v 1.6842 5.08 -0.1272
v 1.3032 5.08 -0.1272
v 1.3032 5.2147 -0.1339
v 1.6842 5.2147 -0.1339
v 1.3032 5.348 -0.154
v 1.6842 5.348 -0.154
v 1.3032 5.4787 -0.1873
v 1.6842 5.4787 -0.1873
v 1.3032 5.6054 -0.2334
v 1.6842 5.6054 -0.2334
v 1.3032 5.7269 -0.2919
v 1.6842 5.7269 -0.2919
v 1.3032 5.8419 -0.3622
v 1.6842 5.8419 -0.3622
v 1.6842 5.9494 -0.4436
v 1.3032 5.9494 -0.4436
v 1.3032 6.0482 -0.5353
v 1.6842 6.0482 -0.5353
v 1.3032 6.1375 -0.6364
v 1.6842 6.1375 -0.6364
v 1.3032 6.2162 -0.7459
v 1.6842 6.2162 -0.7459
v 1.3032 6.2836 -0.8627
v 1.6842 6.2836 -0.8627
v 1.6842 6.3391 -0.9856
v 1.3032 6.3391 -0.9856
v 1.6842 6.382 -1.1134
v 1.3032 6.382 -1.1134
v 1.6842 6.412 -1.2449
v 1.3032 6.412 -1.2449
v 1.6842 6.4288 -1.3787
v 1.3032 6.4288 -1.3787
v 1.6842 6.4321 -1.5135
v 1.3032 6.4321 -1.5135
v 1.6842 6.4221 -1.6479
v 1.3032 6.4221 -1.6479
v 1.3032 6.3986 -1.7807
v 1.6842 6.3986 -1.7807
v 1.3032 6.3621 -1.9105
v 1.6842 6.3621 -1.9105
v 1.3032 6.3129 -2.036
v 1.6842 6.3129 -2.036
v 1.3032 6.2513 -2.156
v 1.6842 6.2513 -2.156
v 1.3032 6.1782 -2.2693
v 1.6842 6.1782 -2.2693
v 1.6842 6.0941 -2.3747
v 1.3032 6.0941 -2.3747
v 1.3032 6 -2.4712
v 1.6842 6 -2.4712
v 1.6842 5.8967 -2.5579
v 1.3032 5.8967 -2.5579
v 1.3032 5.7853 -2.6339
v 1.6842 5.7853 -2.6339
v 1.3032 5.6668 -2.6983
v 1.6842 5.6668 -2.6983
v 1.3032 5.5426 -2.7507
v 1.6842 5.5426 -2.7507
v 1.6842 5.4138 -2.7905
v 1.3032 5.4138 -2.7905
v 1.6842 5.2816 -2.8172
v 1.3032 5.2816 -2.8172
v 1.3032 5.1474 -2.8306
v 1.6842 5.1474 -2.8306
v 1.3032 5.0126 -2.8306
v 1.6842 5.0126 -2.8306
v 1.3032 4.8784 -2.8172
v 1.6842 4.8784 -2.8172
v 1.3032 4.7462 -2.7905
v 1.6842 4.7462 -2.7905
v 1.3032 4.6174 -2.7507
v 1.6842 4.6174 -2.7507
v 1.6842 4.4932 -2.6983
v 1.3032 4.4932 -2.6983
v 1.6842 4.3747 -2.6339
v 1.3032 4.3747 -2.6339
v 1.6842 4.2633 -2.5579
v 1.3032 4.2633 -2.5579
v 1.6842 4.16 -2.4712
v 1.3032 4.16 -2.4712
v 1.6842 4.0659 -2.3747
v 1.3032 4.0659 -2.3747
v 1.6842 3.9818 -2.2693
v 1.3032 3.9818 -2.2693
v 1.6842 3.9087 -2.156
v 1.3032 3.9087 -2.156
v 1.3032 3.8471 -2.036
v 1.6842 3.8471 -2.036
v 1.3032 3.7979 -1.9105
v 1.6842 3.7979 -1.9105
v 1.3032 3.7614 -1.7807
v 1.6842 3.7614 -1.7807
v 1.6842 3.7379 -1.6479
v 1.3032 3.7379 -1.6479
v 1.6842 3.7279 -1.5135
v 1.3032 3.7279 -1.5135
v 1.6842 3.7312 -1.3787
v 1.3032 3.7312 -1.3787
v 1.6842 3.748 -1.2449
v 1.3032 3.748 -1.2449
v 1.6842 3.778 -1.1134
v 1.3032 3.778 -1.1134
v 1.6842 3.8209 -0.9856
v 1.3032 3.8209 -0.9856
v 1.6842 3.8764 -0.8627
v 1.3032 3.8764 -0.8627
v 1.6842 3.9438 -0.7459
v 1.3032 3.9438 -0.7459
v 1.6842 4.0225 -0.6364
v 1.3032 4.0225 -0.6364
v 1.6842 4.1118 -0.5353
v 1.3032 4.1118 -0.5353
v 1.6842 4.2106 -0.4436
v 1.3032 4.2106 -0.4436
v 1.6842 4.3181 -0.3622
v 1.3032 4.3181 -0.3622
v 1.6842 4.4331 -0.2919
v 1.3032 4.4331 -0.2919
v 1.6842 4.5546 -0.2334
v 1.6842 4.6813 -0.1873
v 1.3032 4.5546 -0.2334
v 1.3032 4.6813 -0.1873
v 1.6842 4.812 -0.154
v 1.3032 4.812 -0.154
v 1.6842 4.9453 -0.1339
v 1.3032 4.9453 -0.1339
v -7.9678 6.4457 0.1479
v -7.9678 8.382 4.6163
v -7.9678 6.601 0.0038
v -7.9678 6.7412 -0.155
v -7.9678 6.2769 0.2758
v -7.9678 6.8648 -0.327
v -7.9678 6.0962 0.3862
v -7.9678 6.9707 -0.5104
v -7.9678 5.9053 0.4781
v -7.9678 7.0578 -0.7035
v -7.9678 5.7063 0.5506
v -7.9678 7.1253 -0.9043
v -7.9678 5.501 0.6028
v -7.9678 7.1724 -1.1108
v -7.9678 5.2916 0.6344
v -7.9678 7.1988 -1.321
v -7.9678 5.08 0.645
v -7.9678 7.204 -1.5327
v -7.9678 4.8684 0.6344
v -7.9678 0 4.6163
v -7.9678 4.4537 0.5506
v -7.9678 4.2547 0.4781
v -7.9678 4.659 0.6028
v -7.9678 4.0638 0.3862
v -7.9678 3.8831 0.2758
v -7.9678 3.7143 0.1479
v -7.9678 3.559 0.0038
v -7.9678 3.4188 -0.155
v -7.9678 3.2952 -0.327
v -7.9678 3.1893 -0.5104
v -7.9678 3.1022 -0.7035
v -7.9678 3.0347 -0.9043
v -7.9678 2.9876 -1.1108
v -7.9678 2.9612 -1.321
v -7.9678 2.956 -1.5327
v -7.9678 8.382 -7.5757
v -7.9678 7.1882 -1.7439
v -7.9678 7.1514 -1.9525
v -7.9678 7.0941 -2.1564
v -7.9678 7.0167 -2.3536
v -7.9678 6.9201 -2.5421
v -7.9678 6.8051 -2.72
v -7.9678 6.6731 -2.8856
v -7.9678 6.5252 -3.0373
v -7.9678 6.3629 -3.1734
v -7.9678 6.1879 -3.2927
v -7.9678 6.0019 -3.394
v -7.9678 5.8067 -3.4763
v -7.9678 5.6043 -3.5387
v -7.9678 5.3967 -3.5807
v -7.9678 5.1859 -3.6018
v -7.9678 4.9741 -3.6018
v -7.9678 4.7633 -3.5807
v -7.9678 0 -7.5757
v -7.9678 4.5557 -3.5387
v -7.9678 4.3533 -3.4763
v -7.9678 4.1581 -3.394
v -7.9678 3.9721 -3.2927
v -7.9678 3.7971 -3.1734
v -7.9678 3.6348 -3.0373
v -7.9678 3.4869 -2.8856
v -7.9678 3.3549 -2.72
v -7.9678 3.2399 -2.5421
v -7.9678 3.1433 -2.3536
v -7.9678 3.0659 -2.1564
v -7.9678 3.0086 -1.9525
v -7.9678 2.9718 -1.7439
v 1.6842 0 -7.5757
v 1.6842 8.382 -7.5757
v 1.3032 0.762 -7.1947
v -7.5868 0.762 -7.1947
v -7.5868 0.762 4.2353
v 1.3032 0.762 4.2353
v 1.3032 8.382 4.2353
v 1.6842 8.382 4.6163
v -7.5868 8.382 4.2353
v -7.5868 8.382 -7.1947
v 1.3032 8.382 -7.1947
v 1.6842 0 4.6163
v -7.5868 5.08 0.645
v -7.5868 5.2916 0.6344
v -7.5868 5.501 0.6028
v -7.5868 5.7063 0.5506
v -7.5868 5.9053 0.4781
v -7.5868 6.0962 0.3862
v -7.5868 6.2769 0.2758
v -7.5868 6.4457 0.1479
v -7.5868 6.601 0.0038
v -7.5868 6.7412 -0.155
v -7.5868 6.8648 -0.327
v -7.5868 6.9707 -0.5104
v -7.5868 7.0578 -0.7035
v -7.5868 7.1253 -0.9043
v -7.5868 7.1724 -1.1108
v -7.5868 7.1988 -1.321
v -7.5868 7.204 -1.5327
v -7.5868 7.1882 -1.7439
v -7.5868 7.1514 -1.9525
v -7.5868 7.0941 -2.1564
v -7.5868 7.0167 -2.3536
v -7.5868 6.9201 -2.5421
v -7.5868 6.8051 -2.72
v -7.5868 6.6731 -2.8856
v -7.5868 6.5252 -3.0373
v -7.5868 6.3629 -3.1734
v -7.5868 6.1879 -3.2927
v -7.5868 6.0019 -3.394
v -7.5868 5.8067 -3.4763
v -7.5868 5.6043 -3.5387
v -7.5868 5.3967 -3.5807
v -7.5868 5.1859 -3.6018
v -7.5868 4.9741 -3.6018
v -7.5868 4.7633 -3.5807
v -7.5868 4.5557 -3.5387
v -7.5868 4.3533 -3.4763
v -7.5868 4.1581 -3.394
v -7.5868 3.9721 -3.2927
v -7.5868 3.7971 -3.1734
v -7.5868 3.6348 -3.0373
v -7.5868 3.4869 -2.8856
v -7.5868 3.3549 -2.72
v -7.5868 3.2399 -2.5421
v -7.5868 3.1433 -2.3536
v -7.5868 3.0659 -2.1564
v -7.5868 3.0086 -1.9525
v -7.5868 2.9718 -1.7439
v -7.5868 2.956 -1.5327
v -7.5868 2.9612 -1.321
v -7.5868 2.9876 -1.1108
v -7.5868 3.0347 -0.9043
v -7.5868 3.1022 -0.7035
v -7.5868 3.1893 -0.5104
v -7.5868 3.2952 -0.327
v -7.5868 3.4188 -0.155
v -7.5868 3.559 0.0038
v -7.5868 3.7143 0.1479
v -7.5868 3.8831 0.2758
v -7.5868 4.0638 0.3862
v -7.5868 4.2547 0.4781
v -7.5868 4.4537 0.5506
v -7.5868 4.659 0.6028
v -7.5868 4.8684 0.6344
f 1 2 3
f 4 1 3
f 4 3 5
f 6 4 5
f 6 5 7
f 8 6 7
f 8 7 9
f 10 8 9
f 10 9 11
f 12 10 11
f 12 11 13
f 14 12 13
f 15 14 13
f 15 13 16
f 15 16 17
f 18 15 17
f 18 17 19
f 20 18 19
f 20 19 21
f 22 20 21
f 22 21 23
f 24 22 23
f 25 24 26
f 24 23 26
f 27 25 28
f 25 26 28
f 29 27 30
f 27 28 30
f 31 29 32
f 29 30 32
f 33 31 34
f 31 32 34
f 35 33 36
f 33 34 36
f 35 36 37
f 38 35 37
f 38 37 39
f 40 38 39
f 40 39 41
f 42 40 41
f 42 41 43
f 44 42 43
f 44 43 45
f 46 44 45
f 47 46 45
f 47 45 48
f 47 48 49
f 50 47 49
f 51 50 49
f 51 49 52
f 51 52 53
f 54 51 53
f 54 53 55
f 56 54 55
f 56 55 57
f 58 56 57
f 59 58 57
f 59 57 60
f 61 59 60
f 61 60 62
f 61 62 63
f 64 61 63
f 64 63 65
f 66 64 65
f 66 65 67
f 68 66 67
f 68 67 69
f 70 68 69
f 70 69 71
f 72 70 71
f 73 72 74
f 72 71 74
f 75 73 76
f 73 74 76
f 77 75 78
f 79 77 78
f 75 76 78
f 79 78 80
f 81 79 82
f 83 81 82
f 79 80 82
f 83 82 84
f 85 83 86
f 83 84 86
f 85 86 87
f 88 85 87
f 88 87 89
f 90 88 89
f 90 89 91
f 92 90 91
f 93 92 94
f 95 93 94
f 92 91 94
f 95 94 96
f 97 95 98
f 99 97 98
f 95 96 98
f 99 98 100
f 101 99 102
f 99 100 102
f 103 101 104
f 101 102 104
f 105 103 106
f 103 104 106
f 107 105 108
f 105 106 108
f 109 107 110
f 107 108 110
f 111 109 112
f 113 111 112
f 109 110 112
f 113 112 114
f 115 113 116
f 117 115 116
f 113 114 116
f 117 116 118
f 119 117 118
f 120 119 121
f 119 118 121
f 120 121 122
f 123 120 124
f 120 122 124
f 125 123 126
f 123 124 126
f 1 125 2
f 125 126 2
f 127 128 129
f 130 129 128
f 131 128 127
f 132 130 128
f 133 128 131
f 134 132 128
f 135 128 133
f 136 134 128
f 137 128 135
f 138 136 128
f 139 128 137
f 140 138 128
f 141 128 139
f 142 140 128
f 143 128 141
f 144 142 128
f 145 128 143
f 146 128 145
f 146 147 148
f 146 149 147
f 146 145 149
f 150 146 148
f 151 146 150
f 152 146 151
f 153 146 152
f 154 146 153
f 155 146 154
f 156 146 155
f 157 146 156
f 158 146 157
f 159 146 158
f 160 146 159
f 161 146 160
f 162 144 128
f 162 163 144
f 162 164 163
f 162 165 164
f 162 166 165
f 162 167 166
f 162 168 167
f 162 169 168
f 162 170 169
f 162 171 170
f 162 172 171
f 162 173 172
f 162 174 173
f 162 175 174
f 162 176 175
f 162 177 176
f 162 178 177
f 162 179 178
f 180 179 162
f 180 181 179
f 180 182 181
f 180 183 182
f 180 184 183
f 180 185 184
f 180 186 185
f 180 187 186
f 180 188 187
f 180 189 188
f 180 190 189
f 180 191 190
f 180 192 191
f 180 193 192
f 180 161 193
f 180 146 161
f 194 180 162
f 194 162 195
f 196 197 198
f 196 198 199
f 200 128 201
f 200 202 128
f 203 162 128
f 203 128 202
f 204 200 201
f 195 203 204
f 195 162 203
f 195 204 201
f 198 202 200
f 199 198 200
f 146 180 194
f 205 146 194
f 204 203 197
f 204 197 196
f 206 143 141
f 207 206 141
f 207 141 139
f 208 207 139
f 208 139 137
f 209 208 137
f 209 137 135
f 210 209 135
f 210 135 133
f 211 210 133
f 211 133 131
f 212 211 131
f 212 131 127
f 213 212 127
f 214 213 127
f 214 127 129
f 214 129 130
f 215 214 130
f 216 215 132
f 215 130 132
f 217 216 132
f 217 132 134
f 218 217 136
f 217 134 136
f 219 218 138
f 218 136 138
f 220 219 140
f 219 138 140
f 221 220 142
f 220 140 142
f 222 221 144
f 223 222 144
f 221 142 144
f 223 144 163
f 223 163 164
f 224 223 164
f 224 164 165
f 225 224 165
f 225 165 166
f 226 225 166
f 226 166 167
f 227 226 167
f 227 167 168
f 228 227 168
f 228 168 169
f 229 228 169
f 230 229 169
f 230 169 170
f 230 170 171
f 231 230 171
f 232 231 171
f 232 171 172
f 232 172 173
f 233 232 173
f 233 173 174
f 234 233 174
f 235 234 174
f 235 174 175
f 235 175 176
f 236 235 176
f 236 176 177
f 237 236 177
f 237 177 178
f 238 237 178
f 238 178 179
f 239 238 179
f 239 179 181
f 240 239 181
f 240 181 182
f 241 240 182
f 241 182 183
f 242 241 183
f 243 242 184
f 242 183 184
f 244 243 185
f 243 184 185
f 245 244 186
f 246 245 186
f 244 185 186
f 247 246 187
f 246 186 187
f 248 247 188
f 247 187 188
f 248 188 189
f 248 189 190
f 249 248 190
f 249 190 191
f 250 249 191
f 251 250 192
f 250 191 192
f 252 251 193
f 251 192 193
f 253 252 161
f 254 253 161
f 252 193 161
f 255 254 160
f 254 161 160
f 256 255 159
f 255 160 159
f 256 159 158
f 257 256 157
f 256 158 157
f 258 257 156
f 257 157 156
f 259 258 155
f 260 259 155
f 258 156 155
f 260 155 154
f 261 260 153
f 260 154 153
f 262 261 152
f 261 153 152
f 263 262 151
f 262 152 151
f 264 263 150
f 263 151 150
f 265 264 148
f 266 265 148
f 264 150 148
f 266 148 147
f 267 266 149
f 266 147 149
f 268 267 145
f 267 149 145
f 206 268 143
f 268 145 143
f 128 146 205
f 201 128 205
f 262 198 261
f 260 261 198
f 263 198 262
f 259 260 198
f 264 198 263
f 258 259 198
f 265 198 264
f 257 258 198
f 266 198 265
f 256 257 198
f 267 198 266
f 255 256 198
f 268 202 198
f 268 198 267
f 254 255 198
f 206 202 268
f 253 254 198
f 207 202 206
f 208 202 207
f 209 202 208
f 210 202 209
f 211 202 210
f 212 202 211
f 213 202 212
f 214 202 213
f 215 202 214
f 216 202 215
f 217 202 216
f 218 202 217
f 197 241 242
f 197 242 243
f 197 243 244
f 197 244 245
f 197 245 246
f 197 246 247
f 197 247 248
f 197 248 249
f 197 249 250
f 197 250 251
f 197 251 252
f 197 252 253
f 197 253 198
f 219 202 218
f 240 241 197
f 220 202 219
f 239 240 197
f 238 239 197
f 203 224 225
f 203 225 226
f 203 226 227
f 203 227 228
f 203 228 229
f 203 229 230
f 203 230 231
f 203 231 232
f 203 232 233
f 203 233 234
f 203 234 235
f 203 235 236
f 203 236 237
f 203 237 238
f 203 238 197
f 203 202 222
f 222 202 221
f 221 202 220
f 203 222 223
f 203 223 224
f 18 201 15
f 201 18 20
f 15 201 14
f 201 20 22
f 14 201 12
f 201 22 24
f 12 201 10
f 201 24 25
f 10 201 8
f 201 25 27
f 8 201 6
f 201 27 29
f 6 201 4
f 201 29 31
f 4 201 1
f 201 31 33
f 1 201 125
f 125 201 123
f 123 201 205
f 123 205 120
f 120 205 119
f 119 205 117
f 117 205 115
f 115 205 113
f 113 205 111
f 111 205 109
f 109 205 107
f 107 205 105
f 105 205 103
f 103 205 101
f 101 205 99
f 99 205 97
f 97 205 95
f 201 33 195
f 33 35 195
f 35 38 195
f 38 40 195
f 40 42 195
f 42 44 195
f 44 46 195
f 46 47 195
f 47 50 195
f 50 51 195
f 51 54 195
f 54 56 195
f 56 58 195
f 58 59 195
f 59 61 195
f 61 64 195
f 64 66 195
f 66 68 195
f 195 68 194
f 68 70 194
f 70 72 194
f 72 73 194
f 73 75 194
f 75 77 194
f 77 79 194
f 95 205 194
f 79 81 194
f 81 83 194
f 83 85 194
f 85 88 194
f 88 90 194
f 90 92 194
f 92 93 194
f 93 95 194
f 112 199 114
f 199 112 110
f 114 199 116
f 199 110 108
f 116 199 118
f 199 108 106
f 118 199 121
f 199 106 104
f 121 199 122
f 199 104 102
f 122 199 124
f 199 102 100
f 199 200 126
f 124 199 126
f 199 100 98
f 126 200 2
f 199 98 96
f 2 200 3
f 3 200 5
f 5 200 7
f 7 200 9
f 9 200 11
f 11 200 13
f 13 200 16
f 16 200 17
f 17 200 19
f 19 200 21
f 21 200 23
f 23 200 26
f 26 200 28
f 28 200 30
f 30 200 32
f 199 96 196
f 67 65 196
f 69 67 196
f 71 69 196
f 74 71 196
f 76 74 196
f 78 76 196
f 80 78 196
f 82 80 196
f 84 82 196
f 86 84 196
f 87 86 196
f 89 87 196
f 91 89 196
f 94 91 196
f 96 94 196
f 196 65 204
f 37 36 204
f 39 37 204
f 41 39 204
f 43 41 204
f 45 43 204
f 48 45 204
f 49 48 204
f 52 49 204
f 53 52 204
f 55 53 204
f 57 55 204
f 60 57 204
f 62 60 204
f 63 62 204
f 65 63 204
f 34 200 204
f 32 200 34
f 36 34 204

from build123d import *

# Parameters (mm, degrees)
SKETCH1_W                 = 9.652
SKETCH1_H                 = 12.192
BOSS_EXTRUDE1_DEPTH       = 8.382
SKETCH4_W                 = 8.89
SKETCH4_H                 = 11.43
CUT_EXTRUDE1_DEPTH        = 7.62
CUT_EXTRUDE2_REACH        = 11.652
SKETCH6_R                 = 2.12471
F_6_32_TAPPED_HOLE2_D     = 2.7051
F_6_32_TAPPED_HOLE2_DEPTH = 0.381


with BuildPart() as part:
    # Sketch1 → Boss-Extrude1 (new body)
    with BuildSketch(Plane(origin=(0, 0, 0), x_dir=(1, 0, 0), z_dir=(0, 1, 0))):
        with Locations((-3.14180083, 1.47973444)):
            Rectangle(SKETCH1_W, SKETCH1_H)
    extrude(amount=BOSS_EXTRUDE1_DEPTH)

    # Sketch4 → Cut-Extrude1 (cut)
    with BuildSketch(Plane(origin=(0, 8.382, 0), x_dir=(1, 0, 0), z_dir=(0, 1, 0))):
        with Locations((-3.14180083, 1.47973444)):
            Rectangle(SKETCH4_W, SKETCH4_H)
    extrude(amount=-CUT_EXTRUDE1_DEPTH, mode=Mode.SUBTRACT)

    # Sketch6 → Cut-Extrude2 (cut, up to next)
    with BuildSketch(Plane.ZY.offset(7.96780083), mode=Mode.PRIVATE) as cut_extrude2_sk1:
        with Locations((-1.47973444, 5.08)):
            Circle(SKETCH6_R)
    cut_extrude2_tool1 = extrude(cut_extrude2_sk1.sketch, amount=-CUT_EXTRUDE2_REACH, mode=Mode.PRIVATE) & part.part
    add(cut_extrude2_tool1.solids().sort_by_distance((-7.967801, 5.08, -1.479734))[0], mode=Mode.SUBTRACT)

    # #6-32 Tapped Hole2
    with Locations(Plane(origin=(1.68419917, 0, 0), x_dir=(0, 0, -1), z_dir=(1, 0, 0))):
        with Locations((1.47973444, 5.08)):
            Hole(F_6_32_TAPPED_HOLE2_D / 2, depth=F_6_32_TAPPED_HOLE2_DEPTH)


solid = part.part
